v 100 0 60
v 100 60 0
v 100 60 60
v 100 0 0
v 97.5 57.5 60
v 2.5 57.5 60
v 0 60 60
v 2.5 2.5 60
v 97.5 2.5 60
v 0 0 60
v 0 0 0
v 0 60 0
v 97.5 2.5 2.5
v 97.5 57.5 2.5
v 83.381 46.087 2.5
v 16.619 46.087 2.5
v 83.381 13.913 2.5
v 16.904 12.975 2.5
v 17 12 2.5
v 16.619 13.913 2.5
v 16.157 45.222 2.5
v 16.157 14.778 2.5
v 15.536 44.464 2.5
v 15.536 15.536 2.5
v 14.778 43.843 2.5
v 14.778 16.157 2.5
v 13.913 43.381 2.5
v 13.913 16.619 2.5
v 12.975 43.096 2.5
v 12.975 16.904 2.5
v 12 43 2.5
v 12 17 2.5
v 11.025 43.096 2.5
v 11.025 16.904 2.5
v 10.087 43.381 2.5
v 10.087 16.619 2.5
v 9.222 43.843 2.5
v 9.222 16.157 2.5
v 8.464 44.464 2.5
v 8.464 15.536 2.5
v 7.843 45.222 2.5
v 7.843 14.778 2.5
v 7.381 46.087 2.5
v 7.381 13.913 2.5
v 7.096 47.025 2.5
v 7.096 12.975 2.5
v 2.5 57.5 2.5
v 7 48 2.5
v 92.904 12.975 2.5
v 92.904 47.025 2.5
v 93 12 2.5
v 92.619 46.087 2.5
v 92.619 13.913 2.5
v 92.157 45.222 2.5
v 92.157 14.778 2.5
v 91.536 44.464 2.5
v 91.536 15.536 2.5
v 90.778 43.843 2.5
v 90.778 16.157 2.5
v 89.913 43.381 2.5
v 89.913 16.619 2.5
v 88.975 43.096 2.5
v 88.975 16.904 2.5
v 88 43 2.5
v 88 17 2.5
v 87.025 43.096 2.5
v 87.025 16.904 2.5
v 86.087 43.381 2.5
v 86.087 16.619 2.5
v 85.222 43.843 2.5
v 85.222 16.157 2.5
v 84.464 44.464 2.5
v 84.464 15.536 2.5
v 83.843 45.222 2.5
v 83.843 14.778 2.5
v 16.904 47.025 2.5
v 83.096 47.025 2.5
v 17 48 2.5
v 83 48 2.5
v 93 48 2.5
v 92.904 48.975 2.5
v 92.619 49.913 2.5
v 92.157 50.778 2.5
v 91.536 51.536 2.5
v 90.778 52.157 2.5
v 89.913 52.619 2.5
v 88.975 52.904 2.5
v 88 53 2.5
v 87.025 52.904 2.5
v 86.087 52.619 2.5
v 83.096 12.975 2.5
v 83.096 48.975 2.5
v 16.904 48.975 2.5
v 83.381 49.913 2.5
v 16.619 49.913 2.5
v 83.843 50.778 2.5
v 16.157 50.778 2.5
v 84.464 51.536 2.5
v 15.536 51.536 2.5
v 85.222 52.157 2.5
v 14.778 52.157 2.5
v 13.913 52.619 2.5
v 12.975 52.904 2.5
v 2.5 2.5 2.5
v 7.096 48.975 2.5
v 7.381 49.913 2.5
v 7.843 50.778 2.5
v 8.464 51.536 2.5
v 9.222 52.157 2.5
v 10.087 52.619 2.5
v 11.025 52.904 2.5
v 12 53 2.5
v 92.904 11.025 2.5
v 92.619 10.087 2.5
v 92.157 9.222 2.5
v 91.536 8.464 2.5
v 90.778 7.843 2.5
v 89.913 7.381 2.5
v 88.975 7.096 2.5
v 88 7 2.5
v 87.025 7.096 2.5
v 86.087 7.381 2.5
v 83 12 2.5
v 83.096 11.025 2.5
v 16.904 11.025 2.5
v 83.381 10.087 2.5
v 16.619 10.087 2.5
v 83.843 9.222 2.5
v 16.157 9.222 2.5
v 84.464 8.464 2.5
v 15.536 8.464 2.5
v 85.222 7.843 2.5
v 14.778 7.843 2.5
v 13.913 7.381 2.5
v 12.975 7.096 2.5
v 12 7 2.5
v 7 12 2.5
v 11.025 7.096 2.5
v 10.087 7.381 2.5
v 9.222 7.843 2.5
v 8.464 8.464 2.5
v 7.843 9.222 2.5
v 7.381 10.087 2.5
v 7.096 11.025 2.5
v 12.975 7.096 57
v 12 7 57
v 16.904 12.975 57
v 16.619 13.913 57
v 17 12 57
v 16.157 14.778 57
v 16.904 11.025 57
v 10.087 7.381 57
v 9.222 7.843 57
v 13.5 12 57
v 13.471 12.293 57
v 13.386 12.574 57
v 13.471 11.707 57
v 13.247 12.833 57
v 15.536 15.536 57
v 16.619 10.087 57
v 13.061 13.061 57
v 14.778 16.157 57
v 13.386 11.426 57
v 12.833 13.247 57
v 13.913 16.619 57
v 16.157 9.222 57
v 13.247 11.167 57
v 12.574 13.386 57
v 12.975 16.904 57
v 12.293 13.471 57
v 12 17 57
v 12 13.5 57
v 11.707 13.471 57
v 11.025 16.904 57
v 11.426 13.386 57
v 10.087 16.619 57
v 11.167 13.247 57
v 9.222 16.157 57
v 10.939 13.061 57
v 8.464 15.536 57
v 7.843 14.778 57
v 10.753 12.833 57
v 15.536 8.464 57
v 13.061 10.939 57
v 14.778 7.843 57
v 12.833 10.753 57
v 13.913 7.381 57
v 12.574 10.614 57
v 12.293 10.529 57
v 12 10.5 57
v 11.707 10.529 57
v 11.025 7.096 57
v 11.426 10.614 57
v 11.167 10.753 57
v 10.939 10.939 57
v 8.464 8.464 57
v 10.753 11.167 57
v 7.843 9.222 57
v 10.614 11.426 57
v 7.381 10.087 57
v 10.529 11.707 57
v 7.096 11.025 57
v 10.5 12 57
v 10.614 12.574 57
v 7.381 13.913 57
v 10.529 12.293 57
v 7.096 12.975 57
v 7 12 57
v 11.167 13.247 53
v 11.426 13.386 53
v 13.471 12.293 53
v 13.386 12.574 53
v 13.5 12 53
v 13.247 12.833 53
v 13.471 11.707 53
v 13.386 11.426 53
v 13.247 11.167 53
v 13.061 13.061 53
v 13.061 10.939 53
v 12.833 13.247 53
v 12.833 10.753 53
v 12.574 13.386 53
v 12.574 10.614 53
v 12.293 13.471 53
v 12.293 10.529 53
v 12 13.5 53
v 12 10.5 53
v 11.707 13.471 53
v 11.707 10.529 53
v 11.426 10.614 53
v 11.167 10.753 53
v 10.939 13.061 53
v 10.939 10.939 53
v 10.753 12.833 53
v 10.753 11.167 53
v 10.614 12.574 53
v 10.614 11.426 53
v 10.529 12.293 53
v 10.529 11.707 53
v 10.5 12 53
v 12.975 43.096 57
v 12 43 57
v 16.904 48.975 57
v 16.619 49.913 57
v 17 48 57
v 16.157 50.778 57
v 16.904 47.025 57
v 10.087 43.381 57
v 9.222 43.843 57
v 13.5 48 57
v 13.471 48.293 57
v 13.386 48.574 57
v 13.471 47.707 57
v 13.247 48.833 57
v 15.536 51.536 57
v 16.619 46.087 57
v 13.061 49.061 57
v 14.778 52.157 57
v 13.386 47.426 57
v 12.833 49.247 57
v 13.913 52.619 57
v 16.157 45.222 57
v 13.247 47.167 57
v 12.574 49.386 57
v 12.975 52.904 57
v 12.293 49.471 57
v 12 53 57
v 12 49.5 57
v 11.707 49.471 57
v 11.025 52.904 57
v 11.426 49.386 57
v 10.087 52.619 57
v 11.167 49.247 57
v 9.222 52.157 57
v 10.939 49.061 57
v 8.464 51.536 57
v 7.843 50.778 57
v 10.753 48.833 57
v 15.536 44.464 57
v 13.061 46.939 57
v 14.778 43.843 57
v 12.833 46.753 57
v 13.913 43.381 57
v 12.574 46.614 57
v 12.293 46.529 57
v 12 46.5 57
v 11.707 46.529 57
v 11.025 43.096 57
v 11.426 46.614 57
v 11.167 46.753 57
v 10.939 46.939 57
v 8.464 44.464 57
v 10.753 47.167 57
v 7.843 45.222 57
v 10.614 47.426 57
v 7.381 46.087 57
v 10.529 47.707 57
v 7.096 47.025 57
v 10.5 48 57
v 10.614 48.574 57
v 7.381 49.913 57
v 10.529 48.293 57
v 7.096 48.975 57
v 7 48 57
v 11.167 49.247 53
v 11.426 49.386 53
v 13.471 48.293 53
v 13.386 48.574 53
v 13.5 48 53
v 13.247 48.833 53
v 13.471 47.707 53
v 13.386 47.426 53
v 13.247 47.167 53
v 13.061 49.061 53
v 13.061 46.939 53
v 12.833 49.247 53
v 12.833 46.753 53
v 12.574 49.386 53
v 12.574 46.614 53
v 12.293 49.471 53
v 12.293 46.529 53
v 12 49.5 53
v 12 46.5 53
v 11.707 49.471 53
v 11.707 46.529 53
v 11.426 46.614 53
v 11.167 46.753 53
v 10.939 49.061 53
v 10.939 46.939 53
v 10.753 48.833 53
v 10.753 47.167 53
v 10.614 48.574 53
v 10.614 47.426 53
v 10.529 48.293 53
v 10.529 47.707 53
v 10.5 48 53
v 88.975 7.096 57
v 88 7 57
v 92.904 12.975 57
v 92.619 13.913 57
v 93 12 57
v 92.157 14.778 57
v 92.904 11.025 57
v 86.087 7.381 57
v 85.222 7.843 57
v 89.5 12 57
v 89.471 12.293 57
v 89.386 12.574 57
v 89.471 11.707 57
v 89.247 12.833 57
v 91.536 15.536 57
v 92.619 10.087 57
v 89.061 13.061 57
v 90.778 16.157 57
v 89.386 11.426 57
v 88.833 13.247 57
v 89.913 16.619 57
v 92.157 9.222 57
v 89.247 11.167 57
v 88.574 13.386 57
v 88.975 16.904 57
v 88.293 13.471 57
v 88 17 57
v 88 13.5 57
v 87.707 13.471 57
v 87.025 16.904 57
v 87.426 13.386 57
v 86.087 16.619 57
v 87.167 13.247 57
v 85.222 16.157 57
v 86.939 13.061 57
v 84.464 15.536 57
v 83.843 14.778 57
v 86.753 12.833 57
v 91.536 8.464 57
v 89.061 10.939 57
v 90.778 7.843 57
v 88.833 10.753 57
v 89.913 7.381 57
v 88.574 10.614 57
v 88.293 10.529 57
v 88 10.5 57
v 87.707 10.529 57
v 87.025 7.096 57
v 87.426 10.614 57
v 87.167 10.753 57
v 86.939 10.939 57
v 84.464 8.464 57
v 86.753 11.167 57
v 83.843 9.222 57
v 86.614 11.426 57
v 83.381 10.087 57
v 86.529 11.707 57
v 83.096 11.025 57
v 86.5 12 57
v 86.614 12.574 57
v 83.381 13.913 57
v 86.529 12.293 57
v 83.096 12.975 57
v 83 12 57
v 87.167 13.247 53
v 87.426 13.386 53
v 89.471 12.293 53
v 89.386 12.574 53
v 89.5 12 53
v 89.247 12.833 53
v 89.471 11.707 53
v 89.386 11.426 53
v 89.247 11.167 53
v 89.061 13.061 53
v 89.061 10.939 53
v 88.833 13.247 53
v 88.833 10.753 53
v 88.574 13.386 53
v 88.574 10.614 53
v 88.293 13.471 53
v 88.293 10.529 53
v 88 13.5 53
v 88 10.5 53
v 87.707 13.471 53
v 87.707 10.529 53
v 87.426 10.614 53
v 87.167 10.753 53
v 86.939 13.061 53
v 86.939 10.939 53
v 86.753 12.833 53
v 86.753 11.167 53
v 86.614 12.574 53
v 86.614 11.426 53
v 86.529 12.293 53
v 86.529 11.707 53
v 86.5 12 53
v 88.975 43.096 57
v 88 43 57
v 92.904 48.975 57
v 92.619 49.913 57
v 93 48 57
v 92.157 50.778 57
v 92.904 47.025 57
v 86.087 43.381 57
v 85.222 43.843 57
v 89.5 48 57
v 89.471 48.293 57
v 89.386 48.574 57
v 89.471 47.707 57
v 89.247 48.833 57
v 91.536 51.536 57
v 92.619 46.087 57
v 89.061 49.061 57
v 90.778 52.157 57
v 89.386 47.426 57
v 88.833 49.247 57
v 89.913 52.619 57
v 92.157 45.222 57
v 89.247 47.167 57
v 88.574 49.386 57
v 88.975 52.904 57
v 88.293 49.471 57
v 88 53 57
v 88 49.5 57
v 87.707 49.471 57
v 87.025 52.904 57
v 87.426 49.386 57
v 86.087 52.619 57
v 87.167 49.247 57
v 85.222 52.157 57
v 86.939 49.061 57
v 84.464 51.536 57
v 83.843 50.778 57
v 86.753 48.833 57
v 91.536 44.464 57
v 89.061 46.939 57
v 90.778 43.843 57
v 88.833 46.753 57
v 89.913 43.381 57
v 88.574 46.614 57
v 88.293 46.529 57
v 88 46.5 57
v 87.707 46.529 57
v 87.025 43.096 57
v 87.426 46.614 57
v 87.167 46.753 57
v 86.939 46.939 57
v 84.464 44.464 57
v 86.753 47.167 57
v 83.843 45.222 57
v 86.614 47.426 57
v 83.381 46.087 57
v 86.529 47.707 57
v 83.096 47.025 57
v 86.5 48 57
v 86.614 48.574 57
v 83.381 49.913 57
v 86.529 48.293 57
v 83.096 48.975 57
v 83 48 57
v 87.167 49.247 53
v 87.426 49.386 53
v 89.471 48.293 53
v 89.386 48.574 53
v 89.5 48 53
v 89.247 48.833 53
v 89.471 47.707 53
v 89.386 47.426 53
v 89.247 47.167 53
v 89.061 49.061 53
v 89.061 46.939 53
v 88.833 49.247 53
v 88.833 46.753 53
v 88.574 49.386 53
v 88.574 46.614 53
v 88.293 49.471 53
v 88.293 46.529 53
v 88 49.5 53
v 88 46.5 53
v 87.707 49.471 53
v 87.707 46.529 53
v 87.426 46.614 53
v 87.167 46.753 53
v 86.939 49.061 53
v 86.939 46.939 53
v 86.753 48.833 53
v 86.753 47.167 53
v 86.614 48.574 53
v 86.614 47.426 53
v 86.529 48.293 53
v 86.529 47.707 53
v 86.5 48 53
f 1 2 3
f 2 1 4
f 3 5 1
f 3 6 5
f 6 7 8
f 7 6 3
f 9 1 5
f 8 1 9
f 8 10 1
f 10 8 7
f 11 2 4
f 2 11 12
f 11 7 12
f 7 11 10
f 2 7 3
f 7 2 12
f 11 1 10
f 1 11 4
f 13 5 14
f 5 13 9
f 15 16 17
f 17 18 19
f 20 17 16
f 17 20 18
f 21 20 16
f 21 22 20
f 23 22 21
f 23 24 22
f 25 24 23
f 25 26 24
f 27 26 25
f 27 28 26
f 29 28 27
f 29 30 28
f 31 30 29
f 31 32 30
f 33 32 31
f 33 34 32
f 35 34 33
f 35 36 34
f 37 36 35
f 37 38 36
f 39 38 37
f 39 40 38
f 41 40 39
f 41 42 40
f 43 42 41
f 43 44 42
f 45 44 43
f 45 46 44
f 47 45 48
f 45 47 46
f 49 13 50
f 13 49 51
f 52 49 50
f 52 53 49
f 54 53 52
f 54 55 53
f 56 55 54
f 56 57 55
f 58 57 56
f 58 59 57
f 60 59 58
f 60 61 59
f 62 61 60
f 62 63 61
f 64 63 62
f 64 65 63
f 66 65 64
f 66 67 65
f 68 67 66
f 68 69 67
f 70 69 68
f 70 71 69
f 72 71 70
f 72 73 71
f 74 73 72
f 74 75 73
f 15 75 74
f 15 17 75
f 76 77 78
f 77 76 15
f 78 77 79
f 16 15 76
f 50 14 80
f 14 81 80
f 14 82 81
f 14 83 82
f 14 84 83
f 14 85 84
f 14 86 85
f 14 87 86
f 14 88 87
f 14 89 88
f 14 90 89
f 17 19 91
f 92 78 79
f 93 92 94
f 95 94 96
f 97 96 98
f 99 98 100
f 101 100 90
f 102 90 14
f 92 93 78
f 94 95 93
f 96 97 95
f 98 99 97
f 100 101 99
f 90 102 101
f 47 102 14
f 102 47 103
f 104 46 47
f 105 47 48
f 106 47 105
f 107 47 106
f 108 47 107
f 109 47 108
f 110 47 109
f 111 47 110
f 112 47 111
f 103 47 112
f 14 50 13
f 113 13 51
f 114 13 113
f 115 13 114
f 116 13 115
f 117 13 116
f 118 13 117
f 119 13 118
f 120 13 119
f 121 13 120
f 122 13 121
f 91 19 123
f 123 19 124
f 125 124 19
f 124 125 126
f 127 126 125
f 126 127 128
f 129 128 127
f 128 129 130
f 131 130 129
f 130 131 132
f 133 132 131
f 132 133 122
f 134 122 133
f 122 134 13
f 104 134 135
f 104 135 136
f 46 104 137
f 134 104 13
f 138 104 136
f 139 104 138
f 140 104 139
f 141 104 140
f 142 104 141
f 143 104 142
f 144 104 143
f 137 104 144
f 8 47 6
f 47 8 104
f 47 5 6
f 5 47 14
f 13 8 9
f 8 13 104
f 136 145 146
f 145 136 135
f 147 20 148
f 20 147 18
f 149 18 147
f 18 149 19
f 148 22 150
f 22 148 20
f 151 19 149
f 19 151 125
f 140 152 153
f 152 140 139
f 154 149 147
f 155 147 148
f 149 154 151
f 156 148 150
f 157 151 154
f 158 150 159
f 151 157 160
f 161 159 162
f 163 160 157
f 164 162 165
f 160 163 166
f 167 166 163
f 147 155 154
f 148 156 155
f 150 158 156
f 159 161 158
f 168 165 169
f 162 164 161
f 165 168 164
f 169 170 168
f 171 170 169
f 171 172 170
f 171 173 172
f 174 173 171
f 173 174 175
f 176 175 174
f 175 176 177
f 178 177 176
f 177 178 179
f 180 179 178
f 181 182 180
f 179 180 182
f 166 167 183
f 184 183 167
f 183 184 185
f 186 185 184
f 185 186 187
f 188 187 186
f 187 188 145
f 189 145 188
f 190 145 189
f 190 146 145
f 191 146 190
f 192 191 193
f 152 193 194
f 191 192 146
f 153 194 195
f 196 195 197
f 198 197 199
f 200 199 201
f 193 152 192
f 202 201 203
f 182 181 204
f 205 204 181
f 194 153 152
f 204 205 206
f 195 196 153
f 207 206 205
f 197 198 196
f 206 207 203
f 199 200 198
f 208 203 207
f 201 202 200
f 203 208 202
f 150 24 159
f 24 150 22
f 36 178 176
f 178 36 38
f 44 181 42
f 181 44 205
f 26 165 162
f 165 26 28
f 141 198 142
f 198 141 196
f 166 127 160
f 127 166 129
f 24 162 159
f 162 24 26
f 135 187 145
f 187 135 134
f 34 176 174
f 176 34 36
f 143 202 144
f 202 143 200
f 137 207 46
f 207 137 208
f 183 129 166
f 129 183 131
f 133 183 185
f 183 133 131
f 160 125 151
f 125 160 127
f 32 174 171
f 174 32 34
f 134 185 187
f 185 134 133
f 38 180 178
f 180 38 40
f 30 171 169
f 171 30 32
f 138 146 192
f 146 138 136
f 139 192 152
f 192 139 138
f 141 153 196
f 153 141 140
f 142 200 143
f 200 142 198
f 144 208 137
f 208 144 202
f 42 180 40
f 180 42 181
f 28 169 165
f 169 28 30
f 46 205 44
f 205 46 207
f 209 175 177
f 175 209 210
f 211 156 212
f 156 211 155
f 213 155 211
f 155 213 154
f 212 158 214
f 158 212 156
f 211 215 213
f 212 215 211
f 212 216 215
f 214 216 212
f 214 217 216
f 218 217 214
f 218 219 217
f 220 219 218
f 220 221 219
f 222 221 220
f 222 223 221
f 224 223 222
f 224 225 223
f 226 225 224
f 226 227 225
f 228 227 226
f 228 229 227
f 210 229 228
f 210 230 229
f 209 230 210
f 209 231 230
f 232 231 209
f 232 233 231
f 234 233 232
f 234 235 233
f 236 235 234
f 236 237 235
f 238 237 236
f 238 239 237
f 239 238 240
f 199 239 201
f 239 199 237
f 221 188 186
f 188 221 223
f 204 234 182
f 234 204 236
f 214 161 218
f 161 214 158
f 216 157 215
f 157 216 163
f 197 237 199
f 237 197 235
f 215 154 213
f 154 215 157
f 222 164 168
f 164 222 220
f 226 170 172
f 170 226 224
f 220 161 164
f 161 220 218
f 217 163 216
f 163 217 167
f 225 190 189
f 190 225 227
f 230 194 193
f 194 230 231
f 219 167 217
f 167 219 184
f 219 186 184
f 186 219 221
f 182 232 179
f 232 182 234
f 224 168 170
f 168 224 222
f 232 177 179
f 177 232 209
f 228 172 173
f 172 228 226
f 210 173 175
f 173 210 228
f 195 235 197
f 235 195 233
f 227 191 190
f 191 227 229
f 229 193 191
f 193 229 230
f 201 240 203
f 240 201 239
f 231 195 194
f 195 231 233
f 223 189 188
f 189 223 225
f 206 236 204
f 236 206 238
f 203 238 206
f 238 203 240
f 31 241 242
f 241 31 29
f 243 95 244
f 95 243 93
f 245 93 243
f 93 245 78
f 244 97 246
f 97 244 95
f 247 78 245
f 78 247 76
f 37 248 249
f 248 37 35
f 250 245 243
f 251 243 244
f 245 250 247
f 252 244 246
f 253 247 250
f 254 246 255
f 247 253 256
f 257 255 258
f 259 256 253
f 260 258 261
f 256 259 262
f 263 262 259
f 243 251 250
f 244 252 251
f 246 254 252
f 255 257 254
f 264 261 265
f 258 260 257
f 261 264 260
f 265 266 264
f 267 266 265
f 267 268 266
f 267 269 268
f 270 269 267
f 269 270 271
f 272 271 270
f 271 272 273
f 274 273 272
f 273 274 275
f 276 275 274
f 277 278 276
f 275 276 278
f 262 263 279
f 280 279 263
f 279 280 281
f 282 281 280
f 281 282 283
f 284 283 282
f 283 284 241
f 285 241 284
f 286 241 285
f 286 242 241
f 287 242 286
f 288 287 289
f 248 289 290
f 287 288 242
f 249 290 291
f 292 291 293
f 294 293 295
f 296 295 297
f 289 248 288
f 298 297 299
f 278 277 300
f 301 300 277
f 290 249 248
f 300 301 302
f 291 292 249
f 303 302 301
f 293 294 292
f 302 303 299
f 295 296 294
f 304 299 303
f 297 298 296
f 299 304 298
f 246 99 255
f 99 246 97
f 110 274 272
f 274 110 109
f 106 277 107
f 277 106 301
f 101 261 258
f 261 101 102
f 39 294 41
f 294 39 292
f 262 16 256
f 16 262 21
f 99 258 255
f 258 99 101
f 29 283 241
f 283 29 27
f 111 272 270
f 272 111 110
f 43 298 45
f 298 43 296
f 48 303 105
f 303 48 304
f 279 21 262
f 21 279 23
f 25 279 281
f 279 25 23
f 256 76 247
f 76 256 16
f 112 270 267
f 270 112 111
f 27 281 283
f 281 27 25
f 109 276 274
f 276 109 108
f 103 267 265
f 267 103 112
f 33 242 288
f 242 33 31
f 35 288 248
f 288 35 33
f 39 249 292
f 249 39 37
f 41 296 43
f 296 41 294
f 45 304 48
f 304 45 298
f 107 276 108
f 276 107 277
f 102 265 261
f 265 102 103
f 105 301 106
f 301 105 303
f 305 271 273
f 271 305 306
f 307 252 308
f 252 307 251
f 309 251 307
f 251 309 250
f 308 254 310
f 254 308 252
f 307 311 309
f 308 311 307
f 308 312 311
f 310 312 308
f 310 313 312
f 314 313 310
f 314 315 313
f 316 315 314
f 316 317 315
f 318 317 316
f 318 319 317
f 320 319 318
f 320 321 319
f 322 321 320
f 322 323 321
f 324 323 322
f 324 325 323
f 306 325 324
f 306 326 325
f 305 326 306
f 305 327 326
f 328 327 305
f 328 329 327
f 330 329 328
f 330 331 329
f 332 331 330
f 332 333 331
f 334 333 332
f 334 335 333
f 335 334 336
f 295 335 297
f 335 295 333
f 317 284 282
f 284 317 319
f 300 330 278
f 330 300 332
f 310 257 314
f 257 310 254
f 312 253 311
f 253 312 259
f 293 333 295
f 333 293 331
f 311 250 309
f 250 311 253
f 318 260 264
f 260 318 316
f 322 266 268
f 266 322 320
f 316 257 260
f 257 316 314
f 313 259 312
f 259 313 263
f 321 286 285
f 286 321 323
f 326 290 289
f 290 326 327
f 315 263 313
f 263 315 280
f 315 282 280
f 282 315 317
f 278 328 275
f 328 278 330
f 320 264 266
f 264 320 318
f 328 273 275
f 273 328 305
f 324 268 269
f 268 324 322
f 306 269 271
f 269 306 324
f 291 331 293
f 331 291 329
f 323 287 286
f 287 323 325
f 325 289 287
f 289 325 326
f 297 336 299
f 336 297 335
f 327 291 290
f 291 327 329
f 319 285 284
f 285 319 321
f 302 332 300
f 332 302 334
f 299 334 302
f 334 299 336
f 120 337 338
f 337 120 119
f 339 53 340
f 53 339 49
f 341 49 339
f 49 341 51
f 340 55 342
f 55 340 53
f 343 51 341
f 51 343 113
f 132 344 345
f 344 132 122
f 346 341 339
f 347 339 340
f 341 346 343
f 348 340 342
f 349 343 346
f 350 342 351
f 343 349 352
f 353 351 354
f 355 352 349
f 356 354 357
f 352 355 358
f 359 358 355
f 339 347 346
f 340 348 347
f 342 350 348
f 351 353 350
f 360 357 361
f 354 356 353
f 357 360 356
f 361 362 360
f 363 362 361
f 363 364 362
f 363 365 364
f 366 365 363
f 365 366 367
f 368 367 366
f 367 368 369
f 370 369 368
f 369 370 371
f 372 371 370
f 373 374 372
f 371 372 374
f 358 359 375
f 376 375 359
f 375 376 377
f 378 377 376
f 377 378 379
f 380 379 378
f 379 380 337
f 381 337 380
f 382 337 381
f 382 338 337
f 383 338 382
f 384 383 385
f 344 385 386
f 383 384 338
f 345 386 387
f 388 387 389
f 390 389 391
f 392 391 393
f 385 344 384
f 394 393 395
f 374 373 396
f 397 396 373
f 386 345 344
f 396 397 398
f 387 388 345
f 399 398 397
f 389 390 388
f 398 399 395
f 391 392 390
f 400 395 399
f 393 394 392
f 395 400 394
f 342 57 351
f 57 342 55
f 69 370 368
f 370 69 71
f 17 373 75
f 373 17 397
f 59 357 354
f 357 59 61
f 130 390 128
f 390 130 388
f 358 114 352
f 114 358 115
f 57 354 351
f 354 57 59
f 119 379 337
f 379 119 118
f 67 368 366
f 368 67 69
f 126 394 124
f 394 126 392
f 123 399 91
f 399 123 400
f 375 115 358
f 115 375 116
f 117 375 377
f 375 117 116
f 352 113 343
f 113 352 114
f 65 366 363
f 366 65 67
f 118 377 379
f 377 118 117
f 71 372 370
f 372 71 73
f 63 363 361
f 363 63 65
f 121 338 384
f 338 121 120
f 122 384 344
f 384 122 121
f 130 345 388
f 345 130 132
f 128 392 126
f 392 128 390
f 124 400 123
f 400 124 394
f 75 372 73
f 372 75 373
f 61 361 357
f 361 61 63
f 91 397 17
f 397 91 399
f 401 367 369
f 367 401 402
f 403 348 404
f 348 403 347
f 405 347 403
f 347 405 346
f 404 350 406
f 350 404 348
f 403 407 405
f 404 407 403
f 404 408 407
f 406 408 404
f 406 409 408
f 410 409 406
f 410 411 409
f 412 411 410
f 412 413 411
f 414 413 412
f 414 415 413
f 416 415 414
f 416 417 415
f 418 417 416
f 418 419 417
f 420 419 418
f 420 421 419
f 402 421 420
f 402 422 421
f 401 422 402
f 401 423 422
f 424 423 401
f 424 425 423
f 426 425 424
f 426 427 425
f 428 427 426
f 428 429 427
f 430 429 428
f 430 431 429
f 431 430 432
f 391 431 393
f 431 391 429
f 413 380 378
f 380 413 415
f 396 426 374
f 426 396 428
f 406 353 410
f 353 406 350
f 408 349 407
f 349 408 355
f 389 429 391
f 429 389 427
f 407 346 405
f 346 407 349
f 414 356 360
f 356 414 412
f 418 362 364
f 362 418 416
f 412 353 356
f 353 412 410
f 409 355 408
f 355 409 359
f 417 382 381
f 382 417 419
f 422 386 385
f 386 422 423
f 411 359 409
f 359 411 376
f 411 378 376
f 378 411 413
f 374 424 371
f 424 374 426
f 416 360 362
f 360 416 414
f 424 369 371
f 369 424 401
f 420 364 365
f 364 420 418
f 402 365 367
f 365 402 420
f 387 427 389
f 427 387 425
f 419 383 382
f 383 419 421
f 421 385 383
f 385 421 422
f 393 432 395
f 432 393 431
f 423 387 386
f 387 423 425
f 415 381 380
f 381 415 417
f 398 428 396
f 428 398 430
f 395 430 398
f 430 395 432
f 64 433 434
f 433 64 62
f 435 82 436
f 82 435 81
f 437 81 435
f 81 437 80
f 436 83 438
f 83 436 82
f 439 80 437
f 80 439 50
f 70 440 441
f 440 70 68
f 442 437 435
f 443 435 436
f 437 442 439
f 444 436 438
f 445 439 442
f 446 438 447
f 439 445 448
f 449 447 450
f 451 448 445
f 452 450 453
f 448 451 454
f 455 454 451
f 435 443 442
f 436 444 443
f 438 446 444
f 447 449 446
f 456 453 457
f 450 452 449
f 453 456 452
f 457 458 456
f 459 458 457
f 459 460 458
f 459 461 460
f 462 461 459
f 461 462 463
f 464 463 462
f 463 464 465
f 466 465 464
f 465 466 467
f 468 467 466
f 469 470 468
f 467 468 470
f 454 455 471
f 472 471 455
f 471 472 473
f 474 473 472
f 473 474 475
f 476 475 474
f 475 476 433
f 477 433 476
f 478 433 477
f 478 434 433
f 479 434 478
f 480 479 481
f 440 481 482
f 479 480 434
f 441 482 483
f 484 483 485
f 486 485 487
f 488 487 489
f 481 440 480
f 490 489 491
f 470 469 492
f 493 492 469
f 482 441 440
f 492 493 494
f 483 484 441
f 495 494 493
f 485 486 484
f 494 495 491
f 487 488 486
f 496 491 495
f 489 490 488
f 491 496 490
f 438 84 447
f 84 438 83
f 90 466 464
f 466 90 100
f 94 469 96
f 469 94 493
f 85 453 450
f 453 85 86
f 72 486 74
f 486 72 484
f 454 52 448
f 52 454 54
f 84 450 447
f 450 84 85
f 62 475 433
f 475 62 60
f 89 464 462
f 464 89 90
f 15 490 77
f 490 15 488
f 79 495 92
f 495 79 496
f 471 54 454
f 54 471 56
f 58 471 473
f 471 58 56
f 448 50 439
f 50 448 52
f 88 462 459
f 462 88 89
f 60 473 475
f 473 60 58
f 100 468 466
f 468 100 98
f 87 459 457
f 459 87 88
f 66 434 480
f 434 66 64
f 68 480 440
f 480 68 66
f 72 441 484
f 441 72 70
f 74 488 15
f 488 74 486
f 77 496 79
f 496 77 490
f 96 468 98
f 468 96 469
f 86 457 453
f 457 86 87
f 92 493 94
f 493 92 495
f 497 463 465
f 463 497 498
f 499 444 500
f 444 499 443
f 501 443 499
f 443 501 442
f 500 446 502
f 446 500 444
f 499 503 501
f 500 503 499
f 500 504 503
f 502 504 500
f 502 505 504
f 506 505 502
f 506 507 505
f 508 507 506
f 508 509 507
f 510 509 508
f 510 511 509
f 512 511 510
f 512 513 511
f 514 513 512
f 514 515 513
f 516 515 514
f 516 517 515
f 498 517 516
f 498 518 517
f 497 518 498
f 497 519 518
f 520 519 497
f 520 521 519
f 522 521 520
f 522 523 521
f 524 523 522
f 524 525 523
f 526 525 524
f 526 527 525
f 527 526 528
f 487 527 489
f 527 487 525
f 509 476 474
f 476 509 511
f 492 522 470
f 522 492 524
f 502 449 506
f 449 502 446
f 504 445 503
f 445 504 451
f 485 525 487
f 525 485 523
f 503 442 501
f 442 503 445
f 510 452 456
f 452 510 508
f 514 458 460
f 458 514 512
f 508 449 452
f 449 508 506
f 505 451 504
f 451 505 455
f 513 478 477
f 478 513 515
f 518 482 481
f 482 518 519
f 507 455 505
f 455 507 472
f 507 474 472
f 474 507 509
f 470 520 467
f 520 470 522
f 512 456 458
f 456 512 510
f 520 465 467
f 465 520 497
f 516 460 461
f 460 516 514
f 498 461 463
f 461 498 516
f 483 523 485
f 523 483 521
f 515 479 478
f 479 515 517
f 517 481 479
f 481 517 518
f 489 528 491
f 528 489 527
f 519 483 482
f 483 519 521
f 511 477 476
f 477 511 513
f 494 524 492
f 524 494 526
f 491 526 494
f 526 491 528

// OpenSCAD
$fn = 32;

// ----------------------------------------------------------------------
// Enclosure box: bosses enclosure
// ----------------------------------------------------------------------

// --- parameters (mm) ---
box_l = 100;              // outer length, X
box_w = 60;               // outer width, Y
box_h = 60;               // outer height
wall_t = 2.5;             // wall thickness
boss_r = 5;               // corner boss radius
hole_r = 1.5;             // boss screw hole radius
boss_in = 12;             // boss inset from the corners

inner_h = box_h - wall_t;  // cavity depth
boss_h = inner_h - 2;  // corner boss height

difference() {
  union() {
    difference() {
      cube([box_l, box_w, box_h]);
      translate([wall_t, wall_t, wall_t])
        cube([box_l - 2 * wall_t, box_w - 2 * wall_t, box_h]);
    }
    for (sx = [0, 1], sy = [0, 1])
      translate([sx ? box_l - boss_in : boss_in,
                 sy ? box_w - boss_in : boss_in, wall_t - 1])
        difference() {
          cylinder(r = boss_r, h = boss_h);
          translate([0, 0, boss_h - 4])
            cylinder(r = hole_r, h = 5);
        }
  }
}
